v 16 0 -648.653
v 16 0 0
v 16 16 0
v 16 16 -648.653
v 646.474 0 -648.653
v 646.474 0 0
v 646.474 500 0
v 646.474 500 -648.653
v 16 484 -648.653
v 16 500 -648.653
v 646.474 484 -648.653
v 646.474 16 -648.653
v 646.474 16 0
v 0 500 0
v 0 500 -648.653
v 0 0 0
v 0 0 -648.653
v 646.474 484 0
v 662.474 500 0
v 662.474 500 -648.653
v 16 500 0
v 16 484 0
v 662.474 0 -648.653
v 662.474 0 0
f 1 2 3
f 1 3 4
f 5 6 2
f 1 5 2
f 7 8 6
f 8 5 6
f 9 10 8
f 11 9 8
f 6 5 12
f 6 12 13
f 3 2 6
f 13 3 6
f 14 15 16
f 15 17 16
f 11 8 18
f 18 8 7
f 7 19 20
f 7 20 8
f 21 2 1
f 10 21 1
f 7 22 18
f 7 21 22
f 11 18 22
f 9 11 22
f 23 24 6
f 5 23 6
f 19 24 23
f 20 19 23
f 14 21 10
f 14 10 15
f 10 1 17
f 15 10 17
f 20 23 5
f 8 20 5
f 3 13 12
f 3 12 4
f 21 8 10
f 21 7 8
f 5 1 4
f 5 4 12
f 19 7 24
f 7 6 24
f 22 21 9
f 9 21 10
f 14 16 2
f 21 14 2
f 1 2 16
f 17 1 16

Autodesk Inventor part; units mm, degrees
ref_plane "YZ Plane" through (0, 0, 0) normal (1, 0, 0) x (0, 1, 0)
ref_plane "XZ Plane" through (0, 0, 0) normal (0, 1, 0) x (-1, 0, 0)
ref_plane "XY Plane" through (0, 0, 0) normal (0, 0, 1) x (1, 0, 0)
sketch "Эскиз1" plane through (0, 0, 0) normal (0, 1, 0) x (-1, 0, 0)
  line L0 (0, 0) -> (-16, 0)
  line L1 (-16, 0) -> (-16, -648.6531)
  line L2 (-16, -648.6531) -> (0, -648.6531)
  line L3 (0, -648.6531) -> (0, 0)
  line L4 (-646.4743, 0) -> (-662.4743, 0)
  line L5 (-662.4743, 0) -> (-662.4743, -648.6531)
  line L6 (-662.4743, -648.6531) -> (-646.4743, -648.6531)
  line L7 (-646.4743, -648.6531) -> (-646.4743, 0)
  line L8 (-16, -648.6531) -> (-646.4743, -648.6531)
  line L9 (-16, 0) -> (-646.4743, 0)
  dimension "d0" = 16
  dimension "d1" = 16
  dimension "d46" = 648.653
  dimension "d47" = 662.474
extrude "Выдавливание1" add sketch "Эскиз1" along normal blind 500 contours L3 L2 L1 L0
extrude "Выдавливание2" add sketch "Эскиз1" against normal blind 16 from surface at 500 separate body contours L1 L8 L7 L9
extrude "Выдавливание3" add sketch "Эскиз1" along normal blind 16 separate body contours L1 L8 L7 L9
extrude "Выдавливание4" add sketch "Эскиз1" along normal up to surface (500 mm away) separate body contours L7 L6 L5 L4
equation "\"d0\" = Толщина_каркаса"
equation "\"d1\" = Толщина_каркаса"
equation "\"d5\" = Толщина_каркаса"
equation "\"d7\" = Толщина_каркаса"
equation "\"Толщина_каркаса\" = 16"
equation "\"Стяжка_D\" = 15"
equation "\"Стяжка_h\" = 12.5"
equation "\"Стяжка_D_резьбыШтока\" = 5"
equation "\"Стяжка_D_телаШтока\" = 8"
equation "\"Стяжка_резьбыШтока_Петля_h\" = 12.5"
equation "\"Стяжка_отступ\" = 34"
equation "\"Конфирмат_D_вПласть\" = 8"
equation "\"Конфирмат_D_вТорец\" = 5"
equation "\"Толщина_каркаса_ящика\" = 16"
equation "\"Шкант_D\" = 8"
equation "\"Полкодержатель_D\" = 5"
equation "\"Полкодержатель_смещение_от_низа_полки\" = 5"
equation "\"Петля_D_присадки\" = 35"
equation "\"M_Конфирмат_глубина_резьбы\" = 35"
equation "\"M_Конфирмат_D_вПласть\" = 5"
equation "\"M_Конфирмат_D_вТорец\" = 3"
equation "\"Толщина_задн_ст_Володя\" = 3"
equation "\"Толщина_дна_ящика_Володя\" = 6"
equation "\"Минимальное_расстояния_от_заднСт_ящика_до_заднСт\" = 25"
equation "\"Западание_кромки_полки_за_каркас\" = 5"
equation "\"Стяжкаh_резьбаШтока_Петля_\" = 13"
equation "\"Keep_Excel_Params\" = 106"
equation "\"Стяжкаh_резьбаШтока_Петля\" = 13"
